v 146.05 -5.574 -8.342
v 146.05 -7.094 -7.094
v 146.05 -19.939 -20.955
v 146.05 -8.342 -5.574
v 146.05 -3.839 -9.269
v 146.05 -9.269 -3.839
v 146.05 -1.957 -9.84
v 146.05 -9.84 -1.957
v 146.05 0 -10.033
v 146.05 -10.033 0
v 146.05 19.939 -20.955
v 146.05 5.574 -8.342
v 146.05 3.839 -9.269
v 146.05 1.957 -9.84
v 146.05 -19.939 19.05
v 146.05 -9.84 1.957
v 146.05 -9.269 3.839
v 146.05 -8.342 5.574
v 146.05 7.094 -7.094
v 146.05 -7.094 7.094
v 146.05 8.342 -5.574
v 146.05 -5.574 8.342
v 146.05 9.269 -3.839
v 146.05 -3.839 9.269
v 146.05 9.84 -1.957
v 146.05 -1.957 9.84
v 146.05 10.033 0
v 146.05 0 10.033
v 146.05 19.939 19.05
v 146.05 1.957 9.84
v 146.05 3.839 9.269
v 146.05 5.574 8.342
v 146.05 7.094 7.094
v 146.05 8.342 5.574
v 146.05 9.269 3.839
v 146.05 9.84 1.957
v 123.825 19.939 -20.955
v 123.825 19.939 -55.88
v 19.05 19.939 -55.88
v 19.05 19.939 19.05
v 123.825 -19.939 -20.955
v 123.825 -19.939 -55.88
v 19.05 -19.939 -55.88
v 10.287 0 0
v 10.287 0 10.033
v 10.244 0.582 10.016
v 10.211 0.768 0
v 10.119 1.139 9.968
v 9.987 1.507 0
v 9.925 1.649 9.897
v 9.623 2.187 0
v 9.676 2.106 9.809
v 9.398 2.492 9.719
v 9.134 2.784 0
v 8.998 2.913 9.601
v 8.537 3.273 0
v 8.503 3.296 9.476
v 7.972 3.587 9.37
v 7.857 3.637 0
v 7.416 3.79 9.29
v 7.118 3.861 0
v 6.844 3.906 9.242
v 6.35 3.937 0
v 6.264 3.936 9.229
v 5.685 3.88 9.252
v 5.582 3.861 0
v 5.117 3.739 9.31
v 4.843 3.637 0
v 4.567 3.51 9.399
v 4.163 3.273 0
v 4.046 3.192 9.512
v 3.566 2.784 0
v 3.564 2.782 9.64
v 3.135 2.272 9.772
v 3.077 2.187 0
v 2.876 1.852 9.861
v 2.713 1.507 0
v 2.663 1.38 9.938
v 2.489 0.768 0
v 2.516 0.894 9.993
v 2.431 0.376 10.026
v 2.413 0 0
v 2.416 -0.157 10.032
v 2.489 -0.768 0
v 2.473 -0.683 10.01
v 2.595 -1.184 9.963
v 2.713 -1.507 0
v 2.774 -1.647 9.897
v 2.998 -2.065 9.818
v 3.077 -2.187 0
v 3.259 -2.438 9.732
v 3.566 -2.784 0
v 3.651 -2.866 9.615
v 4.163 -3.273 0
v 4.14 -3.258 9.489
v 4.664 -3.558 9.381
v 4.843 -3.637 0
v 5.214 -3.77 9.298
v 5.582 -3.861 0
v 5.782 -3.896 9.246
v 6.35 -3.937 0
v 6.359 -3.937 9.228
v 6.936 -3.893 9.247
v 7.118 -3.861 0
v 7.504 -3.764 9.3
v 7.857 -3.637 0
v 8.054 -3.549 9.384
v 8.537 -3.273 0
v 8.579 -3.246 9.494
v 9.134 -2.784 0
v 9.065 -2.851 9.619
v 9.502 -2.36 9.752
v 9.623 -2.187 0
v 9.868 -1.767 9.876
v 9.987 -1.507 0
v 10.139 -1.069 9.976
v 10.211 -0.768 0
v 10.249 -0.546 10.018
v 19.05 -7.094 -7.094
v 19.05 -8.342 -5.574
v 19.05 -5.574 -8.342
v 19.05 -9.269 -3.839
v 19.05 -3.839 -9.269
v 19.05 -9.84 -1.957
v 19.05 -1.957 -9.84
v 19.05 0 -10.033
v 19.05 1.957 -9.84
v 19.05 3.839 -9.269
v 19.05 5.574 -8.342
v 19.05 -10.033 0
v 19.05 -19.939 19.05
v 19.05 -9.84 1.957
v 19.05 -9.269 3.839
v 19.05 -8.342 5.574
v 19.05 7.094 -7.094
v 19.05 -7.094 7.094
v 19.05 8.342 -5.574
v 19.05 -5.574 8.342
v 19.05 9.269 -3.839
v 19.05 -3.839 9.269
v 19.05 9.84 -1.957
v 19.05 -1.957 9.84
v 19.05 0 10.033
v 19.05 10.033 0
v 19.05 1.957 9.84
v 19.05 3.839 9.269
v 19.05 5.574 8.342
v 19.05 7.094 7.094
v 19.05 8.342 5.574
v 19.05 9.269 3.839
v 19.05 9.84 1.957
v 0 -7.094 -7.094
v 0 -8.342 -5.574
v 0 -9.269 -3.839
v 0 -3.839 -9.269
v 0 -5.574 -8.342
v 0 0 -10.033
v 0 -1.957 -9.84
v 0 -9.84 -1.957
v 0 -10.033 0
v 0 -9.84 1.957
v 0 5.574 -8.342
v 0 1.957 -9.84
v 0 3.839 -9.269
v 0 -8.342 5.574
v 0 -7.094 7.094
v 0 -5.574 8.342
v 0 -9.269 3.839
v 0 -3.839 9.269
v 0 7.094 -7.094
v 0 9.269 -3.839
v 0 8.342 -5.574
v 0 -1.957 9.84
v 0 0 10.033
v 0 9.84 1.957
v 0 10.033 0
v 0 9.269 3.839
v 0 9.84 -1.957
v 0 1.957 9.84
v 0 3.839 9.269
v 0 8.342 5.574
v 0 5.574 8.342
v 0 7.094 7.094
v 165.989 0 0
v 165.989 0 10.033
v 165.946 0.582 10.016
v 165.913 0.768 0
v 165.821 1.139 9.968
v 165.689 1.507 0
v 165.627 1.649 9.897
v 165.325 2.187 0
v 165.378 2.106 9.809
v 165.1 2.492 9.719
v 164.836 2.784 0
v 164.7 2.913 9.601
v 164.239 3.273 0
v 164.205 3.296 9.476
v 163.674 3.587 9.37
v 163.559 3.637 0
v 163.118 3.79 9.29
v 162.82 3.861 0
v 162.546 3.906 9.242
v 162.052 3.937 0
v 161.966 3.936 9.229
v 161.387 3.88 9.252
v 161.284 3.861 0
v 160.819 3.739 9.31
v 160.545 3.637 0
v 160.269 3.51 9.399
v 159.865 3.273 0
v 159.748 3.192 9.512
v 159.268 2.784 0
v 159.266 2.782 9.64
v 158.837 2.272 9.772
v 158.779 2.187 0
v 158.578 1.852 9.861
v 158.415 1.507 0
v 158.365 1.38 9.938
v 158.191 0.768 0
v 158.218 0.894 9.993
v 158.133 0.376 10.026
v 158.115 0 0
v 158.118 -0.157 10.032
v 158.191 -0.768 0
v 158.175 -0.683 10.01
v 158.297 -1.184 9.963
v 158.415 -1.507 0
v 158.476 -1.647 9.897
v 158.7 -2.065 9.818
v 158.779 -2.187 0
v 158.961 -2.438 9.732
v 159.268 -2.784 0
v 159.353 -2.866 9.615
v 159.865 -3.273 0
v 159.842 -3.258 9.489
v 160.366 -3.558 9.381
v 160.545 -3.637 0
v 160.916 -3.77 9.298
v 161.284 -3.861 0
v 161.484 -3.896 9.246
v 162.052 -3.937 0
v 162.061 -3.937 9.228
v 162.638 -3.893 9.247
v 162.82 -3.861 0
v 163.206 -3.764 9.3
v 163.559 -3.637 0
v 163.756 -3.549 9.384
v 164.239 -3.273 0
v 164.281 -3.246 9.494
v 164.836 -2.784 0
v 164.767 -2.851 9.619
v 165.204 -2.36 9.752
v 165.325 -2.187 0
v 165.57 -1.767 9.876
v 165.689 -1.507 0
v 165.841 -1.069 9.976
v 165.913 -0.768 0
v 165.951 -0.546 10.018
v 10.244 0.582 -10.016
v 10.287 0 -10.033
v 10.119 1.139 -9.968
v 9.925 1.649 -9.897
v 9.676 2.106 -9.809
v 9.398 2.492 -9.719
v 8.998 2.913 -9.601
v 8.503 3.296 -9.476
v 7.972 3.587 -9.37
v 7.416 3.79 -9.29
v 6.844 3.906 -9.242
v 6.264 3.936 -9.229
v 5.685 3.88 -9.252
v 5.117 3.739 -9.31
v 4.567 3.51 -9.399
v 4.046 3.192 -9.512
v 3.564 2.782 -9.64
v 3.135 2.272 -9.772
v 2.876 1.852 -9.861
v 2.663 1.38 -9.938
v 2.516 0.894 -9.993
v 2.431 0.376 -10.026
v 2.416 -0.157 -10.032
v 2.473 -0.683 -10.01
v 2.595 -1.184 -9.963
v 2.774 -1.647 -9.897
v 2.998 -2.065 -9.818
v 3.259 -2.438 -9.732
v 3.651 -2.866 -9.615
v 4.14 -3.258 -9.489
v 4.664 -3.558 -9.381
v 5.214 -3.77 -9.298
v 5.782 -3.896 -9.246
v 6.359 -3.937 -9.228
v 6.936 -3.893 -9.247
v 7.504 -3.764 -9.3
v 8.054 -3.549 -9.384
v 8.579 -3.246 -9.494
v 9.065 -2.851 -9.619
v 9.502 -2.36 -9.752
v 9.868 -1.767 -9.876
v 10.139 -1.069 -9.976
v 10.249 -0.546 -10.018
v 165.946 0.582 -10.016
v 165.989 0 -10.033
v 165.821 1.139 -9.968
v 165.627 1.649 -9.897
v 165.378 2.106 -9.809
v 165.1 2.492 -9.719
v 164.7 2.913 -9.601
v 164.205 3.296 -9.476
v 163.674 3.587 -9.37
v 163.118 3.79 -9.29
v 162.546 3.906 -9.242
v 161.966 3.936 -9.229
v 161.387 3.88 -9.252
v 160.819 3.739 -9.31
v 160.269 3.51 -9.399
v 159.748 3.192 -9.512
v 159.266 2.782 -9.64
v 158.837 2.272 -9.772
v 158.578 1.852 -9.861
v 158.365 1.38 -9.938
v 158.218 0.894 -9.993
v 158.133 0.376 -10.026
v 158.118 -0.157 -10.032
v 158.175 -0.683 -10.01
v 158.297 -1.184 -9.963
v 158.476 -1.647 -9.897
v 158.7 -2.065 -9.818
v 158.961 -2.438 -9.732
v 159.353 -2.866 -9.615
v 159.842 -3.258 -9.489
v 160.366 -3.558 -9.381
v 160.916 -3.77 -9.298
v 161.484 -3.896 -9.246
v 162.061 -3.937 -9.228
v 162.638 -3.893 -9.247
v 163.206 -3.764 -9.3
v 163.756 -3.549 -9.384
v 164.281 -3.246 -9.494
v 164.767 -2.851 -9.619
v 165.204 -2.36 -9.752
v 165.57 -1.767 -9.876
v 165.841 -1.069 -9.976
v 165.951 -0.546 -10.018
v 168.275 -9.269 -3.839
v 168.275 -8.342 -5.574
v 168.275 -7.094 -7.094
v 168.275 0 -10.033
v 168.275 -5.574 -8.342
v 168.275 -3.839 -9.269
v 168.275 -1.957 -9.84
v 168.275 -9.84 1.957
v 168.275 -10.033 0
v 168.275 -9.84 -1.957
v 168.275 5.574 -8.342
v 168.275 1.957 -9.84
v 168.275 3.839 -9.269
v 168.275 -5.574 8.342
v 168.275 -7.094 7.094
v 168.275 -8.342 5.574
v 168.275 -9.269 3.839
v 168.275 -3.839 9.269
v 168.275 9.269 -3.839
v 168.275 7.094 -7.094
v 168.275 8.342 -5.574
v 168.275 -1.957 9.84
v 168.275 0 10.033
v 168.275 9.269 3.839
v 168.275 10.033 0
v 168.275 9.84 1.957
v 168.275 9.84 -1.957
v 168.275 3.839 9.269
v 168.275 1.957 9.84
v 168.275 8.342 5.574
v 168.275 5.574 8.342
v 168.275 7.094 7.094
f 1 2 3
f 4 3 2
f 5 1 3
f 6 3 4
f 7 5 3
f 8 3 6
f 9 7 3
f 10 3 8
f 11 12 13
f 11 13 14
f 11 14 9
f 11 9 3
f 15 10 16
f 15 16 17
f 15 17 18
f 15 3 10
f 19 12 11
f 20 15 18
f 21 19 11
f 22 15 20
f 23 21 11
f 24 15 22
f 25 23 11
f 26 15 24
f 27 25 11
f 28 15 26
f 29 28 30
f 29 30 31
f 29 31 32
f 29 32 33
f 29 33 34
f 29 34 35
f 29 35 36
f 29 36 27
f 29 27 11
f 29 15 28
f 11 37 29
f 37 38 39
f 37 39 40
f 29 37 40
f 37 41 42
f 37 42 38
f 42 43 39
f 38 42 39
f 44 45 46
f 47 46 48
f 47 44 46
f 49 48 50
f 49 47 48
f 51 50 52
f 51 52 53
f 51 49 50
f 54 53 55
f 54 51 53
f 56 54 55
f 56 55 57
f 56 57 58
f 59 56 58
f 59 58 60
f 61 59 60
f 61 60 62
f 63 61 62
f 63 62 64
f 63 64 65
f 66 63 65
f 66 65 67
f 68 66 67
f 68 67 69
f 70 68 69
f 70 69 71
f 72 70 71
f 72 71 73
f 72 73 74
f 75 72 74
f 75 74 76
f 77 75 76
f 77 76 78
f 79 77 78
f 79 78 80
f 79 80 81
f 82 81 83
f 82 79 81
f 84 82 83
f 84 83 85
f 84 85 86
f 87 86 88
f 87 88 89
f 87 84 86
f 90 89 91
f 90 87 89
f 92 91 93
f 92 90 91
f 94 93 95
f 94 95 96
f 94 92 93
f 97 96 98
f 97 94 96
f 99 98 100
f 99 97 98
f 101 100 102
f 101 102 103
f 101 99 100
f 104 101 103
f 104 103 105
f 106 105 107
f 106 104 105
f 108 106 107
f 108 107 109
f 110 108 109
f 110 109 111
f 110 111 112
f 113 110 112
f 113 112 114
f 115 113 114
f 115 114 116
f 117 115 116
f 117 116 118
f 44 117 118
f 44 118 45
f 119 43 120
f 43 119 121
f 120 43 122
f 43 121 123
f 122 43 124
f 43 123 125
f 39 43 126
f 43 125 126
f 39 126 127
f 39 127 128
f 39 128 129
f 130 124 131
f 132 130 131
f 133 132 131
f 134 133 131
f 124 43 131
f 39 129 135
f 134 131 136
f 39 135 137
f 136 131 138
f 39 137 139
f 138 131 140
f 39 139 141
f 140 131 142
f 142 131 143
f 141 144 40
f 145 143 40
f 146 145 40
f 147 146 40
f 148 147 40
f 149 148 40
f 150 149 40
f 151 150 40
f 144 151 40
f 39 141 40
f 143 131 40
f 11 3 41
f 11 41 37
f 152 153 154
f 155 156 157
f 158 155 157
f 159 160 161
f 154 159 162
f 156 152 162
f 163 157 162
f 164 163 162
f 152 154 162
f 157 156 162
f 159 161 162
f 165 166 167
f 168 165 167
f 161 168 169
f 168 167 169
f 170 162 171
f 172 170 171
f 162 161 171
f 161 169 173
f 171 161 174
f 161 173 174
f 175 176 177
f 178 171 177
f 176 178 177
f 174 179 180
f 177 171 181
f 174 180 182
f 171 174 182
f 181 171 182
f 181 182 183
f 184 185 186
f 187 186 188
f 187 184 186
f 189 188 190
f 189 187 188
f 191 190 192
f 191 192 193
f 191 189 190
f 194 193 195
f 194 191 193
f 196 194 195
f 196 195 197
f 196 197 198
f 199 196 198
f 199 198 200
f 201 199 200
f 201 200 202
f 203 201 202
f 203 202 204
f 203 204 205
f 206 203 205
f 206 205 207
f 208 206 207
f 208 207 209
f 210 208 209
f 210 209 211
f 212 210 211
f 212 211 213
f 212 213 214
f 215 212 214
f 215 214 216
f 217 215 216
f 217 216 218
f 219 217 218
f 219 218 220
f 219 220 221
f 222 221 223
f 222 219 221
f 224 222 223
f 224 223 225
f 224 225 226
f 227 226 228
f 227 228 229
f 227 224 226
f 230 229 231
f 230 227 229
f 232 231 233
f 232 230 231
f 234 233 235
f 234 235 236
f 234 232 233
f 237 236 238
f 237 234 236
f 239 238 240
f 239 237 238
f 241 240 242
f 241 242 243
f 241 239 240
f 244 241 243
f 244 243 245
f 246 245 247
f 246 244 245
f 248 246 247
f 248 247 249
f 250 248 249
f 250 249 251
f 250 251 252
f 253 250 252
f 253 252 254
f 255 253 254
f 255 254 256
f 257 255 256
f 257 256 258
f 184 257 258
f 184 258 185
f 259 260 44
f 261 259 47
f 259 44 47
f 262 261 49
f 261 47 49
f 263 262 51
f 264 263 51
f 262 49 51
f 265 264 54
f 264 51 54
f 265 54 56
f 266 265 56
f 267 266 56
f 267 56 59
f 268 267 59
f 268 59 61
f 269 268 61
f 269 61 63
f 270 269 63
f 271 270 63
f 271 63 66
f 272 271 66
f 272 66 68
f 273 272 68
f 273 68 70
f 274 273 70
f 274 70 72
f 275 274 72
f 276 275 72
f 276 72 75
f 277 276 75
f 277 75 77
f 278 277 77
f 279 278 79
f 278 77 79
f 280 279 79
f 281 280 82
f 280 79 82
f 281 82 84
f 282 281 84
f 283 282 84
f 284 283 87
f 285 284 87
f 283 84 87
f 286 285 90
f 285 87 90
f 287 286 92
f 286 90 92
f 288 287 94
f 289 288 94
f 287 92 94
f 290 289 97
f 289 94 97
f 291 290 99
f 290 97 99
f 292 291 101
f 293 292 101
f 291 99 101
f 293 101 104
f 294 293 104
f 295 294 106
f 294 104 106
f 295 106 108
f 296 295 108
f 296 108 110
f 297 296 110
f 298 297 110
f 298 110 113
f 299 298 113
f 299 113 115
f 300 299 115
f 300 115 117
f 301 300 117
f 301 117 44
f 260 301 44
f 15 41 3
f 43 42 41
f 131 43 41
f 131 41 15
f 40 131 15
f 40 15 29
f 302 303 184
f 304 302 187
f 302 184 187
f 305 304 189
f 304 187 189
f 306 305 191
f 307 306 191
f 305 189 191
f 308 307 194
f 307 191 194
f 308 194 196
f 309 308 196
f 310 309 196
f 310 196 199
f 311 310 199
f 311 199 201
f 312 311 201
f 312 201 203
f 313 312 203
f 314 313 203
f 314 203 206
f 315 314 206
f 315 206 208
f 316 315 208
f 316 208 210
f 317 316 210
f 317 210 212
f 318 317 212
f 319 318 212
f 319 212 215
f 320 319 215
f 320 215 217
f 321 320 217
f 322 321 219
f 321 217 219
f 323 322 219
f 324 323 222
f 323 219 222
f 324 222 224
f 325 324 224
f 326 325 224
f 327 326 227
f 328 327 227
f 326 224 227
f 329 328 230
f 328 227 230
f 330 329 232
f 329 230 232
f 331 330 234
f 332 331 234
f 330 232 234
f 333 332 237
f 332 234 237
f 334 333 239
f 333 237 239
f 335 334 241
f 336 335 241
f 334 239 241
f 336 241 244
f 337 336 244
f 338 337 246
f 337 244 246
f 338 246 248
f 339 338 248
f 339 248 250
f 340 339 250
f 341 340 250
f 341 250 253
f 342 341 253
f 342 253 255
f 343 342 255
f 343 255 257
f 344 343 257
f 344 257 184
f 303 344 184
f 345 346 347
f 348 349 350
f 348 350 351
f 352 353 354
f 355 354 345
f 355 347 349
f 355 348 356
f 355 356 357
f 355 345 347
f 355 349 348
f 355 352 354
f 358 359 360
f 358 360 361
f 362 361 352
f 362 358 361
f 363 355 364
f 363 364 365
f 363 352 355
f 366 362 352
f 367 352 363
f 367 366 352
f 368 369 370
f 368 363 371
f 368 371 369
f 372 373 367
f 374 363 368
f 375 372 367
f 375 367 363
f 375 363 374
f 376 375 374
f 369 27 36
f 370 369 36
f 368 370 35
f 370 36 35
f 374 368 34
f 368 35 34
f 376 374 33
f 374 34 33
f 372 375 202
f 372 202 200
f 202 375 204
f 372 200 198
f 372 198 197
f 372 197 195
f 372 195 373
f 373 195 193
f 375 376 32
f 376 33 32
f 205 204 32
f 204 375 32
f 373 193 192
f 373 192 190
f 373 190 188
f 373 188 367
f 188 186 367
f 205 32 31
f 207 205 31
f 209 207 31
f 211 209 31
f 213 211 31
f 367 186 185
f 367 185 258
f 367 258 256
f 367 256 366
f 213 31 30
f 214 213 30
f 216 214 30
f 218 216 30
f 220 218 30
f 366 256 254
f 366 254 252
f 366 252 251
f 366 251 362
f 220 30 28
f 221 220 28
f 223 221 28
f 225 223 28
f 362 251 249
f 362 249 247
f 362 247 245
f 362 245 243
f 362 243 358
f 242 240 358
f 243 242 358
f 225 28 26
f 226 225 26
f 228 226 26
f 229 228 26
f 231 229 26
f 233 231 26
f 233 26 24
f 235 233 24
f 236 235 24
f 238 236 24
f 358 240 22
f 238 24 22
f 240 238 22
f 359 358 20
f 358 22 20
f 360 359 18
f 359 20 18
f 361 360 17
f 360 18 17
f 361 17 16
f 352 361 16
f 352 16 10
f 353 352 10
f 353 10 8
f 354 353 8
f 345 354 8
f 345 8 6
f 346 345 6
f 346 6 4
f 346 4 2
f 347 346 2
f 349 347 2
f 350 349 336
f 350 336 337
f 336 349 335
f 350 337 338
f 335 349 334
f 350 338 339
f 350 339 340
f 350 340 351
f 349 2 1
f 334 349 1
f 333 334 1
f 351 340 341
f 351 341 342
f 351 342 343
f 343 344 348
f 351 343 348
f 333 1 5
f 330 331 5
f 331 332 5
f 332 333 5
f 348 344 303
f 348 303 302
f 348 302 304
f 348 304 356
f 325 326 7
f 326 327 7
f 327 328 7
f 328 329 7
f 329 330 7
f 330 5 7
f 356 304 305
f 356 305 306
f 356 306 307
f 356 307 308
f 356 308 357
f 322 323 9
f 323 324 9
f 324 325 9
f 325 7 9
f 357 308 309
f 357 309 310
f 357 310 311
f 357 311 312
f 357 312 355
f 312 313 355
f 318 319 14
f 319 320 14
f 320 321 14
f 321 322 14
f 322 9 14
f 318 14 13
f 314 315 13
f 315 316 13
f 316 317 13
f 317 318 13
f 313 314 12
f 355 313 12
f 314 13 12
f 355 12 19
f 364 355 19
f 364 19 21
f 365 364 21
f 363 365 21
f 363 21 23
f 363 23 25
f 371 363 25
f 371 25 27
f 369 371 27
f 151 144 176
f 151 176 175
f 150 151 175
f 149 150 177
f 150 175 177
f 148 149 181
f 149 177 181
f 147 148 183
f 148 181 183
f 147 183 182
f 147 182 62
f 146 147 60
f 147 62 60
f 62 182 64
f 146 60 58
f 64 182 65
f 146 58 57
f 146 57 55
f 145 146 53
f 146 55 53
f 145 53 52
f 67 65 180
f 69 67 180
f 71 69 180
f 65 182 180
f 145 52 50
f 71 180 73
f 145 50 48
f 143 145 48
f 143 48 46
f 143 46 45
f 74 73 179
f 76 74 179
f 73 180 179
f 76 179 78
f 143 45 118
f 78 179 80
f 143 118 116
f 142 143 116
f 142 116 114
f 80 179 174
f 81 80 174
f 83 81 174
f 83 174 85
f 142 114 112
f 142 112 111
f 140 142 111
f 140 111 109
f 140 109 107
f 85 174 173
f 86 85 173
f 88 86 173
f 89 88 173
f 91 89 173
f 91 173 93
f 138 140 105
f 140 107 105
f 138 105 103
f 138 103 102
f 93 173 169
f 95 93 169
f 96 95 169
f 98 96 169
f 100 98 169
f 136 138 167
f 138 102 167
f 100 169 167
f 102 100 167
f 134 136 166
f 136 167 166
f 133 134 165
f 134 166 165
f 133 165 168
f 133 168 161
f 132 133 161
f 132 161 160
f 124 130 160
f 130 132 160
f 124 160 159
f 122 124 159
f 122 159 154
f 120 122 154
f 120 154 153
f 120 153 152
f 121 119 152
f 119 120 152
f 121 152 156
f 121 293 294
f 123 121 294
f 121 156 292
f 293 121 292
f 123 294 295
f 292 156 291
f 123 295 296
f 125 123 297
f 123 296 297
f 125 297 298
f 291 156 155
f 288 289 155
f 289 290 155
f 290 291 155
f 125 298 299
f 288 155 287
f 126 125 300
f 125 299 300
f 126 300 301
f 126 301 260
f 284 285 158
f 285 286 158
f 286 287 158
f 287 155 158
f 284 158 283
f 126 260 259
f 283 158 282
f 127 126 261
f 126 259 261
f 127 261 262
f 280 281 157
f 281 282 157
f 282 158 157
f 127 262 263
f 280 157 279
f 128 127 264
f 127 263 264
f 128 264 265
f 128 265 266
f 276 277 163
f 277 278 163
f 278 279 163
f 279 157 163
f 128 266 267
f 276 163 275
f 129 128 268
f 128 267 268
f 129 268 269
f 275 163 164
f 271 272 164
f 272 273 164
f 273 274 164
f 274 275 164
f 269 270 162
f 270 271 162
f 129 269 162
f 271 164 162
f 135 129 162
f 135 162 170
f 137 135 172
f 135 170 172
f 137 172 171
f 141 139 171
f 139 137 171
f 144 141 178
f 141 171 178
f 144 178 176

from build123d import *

# Parameters (mm, degrees)
F0_R          = 10.033
F1_DEPTH      = 168.275
F3_W          = 39.878
F3_H          = 74.93
F4_DEPTH      = 127
F5_W          = 39.878
F5_H          = 34.925
F6_DEPTH      = 22.225
F7_R          = 3.937
F8_DEPTH      = 19.051
F8_DEPTH_BACK = 55.881


with BuildPart() as f1:
    # F0 (on Right) → F1 (new body)
    with BuildSketch(Plane.YZ):
        Circle(F0_R)
    extrude(amount=F1_DEPTH)

    # F3 (on offset) → F4 (join)
    with BuildSketch(Plane.YZ.offset(19.05)):
        with Locations((0, -18.415)):
            Rectangle(F3_W, F3_H)
    extrude(amount=F4_DEPTH)

    # F5 (on face) → F6 (cut)
    with BuildSketch(Plane.YZ.offset(146.05)):
        with Locations((0, -38.4175)):
            Rectangle(F5_W, F5_H)
    extrude(amount=-F6_DEPTH, mode=Mode.SUBTRACT)

    # F7 (on Top) → F8 (cut, two sides)
    with BuildSketch(Plane.XY) as f8_sk:
        with Locations((6.35, 0)):
            Circle(F7_R)
        with Locations((162.052, 0)):
            Circle(F7_R)
    extrude(amount=F8_DEPTH, mode=Mode.SUBTRACT)
    extrude(f8_sk.sketch, amount=-F8_DEPTH_BACK, mode=Mode.SUBTRACT)


solid = f1.part
